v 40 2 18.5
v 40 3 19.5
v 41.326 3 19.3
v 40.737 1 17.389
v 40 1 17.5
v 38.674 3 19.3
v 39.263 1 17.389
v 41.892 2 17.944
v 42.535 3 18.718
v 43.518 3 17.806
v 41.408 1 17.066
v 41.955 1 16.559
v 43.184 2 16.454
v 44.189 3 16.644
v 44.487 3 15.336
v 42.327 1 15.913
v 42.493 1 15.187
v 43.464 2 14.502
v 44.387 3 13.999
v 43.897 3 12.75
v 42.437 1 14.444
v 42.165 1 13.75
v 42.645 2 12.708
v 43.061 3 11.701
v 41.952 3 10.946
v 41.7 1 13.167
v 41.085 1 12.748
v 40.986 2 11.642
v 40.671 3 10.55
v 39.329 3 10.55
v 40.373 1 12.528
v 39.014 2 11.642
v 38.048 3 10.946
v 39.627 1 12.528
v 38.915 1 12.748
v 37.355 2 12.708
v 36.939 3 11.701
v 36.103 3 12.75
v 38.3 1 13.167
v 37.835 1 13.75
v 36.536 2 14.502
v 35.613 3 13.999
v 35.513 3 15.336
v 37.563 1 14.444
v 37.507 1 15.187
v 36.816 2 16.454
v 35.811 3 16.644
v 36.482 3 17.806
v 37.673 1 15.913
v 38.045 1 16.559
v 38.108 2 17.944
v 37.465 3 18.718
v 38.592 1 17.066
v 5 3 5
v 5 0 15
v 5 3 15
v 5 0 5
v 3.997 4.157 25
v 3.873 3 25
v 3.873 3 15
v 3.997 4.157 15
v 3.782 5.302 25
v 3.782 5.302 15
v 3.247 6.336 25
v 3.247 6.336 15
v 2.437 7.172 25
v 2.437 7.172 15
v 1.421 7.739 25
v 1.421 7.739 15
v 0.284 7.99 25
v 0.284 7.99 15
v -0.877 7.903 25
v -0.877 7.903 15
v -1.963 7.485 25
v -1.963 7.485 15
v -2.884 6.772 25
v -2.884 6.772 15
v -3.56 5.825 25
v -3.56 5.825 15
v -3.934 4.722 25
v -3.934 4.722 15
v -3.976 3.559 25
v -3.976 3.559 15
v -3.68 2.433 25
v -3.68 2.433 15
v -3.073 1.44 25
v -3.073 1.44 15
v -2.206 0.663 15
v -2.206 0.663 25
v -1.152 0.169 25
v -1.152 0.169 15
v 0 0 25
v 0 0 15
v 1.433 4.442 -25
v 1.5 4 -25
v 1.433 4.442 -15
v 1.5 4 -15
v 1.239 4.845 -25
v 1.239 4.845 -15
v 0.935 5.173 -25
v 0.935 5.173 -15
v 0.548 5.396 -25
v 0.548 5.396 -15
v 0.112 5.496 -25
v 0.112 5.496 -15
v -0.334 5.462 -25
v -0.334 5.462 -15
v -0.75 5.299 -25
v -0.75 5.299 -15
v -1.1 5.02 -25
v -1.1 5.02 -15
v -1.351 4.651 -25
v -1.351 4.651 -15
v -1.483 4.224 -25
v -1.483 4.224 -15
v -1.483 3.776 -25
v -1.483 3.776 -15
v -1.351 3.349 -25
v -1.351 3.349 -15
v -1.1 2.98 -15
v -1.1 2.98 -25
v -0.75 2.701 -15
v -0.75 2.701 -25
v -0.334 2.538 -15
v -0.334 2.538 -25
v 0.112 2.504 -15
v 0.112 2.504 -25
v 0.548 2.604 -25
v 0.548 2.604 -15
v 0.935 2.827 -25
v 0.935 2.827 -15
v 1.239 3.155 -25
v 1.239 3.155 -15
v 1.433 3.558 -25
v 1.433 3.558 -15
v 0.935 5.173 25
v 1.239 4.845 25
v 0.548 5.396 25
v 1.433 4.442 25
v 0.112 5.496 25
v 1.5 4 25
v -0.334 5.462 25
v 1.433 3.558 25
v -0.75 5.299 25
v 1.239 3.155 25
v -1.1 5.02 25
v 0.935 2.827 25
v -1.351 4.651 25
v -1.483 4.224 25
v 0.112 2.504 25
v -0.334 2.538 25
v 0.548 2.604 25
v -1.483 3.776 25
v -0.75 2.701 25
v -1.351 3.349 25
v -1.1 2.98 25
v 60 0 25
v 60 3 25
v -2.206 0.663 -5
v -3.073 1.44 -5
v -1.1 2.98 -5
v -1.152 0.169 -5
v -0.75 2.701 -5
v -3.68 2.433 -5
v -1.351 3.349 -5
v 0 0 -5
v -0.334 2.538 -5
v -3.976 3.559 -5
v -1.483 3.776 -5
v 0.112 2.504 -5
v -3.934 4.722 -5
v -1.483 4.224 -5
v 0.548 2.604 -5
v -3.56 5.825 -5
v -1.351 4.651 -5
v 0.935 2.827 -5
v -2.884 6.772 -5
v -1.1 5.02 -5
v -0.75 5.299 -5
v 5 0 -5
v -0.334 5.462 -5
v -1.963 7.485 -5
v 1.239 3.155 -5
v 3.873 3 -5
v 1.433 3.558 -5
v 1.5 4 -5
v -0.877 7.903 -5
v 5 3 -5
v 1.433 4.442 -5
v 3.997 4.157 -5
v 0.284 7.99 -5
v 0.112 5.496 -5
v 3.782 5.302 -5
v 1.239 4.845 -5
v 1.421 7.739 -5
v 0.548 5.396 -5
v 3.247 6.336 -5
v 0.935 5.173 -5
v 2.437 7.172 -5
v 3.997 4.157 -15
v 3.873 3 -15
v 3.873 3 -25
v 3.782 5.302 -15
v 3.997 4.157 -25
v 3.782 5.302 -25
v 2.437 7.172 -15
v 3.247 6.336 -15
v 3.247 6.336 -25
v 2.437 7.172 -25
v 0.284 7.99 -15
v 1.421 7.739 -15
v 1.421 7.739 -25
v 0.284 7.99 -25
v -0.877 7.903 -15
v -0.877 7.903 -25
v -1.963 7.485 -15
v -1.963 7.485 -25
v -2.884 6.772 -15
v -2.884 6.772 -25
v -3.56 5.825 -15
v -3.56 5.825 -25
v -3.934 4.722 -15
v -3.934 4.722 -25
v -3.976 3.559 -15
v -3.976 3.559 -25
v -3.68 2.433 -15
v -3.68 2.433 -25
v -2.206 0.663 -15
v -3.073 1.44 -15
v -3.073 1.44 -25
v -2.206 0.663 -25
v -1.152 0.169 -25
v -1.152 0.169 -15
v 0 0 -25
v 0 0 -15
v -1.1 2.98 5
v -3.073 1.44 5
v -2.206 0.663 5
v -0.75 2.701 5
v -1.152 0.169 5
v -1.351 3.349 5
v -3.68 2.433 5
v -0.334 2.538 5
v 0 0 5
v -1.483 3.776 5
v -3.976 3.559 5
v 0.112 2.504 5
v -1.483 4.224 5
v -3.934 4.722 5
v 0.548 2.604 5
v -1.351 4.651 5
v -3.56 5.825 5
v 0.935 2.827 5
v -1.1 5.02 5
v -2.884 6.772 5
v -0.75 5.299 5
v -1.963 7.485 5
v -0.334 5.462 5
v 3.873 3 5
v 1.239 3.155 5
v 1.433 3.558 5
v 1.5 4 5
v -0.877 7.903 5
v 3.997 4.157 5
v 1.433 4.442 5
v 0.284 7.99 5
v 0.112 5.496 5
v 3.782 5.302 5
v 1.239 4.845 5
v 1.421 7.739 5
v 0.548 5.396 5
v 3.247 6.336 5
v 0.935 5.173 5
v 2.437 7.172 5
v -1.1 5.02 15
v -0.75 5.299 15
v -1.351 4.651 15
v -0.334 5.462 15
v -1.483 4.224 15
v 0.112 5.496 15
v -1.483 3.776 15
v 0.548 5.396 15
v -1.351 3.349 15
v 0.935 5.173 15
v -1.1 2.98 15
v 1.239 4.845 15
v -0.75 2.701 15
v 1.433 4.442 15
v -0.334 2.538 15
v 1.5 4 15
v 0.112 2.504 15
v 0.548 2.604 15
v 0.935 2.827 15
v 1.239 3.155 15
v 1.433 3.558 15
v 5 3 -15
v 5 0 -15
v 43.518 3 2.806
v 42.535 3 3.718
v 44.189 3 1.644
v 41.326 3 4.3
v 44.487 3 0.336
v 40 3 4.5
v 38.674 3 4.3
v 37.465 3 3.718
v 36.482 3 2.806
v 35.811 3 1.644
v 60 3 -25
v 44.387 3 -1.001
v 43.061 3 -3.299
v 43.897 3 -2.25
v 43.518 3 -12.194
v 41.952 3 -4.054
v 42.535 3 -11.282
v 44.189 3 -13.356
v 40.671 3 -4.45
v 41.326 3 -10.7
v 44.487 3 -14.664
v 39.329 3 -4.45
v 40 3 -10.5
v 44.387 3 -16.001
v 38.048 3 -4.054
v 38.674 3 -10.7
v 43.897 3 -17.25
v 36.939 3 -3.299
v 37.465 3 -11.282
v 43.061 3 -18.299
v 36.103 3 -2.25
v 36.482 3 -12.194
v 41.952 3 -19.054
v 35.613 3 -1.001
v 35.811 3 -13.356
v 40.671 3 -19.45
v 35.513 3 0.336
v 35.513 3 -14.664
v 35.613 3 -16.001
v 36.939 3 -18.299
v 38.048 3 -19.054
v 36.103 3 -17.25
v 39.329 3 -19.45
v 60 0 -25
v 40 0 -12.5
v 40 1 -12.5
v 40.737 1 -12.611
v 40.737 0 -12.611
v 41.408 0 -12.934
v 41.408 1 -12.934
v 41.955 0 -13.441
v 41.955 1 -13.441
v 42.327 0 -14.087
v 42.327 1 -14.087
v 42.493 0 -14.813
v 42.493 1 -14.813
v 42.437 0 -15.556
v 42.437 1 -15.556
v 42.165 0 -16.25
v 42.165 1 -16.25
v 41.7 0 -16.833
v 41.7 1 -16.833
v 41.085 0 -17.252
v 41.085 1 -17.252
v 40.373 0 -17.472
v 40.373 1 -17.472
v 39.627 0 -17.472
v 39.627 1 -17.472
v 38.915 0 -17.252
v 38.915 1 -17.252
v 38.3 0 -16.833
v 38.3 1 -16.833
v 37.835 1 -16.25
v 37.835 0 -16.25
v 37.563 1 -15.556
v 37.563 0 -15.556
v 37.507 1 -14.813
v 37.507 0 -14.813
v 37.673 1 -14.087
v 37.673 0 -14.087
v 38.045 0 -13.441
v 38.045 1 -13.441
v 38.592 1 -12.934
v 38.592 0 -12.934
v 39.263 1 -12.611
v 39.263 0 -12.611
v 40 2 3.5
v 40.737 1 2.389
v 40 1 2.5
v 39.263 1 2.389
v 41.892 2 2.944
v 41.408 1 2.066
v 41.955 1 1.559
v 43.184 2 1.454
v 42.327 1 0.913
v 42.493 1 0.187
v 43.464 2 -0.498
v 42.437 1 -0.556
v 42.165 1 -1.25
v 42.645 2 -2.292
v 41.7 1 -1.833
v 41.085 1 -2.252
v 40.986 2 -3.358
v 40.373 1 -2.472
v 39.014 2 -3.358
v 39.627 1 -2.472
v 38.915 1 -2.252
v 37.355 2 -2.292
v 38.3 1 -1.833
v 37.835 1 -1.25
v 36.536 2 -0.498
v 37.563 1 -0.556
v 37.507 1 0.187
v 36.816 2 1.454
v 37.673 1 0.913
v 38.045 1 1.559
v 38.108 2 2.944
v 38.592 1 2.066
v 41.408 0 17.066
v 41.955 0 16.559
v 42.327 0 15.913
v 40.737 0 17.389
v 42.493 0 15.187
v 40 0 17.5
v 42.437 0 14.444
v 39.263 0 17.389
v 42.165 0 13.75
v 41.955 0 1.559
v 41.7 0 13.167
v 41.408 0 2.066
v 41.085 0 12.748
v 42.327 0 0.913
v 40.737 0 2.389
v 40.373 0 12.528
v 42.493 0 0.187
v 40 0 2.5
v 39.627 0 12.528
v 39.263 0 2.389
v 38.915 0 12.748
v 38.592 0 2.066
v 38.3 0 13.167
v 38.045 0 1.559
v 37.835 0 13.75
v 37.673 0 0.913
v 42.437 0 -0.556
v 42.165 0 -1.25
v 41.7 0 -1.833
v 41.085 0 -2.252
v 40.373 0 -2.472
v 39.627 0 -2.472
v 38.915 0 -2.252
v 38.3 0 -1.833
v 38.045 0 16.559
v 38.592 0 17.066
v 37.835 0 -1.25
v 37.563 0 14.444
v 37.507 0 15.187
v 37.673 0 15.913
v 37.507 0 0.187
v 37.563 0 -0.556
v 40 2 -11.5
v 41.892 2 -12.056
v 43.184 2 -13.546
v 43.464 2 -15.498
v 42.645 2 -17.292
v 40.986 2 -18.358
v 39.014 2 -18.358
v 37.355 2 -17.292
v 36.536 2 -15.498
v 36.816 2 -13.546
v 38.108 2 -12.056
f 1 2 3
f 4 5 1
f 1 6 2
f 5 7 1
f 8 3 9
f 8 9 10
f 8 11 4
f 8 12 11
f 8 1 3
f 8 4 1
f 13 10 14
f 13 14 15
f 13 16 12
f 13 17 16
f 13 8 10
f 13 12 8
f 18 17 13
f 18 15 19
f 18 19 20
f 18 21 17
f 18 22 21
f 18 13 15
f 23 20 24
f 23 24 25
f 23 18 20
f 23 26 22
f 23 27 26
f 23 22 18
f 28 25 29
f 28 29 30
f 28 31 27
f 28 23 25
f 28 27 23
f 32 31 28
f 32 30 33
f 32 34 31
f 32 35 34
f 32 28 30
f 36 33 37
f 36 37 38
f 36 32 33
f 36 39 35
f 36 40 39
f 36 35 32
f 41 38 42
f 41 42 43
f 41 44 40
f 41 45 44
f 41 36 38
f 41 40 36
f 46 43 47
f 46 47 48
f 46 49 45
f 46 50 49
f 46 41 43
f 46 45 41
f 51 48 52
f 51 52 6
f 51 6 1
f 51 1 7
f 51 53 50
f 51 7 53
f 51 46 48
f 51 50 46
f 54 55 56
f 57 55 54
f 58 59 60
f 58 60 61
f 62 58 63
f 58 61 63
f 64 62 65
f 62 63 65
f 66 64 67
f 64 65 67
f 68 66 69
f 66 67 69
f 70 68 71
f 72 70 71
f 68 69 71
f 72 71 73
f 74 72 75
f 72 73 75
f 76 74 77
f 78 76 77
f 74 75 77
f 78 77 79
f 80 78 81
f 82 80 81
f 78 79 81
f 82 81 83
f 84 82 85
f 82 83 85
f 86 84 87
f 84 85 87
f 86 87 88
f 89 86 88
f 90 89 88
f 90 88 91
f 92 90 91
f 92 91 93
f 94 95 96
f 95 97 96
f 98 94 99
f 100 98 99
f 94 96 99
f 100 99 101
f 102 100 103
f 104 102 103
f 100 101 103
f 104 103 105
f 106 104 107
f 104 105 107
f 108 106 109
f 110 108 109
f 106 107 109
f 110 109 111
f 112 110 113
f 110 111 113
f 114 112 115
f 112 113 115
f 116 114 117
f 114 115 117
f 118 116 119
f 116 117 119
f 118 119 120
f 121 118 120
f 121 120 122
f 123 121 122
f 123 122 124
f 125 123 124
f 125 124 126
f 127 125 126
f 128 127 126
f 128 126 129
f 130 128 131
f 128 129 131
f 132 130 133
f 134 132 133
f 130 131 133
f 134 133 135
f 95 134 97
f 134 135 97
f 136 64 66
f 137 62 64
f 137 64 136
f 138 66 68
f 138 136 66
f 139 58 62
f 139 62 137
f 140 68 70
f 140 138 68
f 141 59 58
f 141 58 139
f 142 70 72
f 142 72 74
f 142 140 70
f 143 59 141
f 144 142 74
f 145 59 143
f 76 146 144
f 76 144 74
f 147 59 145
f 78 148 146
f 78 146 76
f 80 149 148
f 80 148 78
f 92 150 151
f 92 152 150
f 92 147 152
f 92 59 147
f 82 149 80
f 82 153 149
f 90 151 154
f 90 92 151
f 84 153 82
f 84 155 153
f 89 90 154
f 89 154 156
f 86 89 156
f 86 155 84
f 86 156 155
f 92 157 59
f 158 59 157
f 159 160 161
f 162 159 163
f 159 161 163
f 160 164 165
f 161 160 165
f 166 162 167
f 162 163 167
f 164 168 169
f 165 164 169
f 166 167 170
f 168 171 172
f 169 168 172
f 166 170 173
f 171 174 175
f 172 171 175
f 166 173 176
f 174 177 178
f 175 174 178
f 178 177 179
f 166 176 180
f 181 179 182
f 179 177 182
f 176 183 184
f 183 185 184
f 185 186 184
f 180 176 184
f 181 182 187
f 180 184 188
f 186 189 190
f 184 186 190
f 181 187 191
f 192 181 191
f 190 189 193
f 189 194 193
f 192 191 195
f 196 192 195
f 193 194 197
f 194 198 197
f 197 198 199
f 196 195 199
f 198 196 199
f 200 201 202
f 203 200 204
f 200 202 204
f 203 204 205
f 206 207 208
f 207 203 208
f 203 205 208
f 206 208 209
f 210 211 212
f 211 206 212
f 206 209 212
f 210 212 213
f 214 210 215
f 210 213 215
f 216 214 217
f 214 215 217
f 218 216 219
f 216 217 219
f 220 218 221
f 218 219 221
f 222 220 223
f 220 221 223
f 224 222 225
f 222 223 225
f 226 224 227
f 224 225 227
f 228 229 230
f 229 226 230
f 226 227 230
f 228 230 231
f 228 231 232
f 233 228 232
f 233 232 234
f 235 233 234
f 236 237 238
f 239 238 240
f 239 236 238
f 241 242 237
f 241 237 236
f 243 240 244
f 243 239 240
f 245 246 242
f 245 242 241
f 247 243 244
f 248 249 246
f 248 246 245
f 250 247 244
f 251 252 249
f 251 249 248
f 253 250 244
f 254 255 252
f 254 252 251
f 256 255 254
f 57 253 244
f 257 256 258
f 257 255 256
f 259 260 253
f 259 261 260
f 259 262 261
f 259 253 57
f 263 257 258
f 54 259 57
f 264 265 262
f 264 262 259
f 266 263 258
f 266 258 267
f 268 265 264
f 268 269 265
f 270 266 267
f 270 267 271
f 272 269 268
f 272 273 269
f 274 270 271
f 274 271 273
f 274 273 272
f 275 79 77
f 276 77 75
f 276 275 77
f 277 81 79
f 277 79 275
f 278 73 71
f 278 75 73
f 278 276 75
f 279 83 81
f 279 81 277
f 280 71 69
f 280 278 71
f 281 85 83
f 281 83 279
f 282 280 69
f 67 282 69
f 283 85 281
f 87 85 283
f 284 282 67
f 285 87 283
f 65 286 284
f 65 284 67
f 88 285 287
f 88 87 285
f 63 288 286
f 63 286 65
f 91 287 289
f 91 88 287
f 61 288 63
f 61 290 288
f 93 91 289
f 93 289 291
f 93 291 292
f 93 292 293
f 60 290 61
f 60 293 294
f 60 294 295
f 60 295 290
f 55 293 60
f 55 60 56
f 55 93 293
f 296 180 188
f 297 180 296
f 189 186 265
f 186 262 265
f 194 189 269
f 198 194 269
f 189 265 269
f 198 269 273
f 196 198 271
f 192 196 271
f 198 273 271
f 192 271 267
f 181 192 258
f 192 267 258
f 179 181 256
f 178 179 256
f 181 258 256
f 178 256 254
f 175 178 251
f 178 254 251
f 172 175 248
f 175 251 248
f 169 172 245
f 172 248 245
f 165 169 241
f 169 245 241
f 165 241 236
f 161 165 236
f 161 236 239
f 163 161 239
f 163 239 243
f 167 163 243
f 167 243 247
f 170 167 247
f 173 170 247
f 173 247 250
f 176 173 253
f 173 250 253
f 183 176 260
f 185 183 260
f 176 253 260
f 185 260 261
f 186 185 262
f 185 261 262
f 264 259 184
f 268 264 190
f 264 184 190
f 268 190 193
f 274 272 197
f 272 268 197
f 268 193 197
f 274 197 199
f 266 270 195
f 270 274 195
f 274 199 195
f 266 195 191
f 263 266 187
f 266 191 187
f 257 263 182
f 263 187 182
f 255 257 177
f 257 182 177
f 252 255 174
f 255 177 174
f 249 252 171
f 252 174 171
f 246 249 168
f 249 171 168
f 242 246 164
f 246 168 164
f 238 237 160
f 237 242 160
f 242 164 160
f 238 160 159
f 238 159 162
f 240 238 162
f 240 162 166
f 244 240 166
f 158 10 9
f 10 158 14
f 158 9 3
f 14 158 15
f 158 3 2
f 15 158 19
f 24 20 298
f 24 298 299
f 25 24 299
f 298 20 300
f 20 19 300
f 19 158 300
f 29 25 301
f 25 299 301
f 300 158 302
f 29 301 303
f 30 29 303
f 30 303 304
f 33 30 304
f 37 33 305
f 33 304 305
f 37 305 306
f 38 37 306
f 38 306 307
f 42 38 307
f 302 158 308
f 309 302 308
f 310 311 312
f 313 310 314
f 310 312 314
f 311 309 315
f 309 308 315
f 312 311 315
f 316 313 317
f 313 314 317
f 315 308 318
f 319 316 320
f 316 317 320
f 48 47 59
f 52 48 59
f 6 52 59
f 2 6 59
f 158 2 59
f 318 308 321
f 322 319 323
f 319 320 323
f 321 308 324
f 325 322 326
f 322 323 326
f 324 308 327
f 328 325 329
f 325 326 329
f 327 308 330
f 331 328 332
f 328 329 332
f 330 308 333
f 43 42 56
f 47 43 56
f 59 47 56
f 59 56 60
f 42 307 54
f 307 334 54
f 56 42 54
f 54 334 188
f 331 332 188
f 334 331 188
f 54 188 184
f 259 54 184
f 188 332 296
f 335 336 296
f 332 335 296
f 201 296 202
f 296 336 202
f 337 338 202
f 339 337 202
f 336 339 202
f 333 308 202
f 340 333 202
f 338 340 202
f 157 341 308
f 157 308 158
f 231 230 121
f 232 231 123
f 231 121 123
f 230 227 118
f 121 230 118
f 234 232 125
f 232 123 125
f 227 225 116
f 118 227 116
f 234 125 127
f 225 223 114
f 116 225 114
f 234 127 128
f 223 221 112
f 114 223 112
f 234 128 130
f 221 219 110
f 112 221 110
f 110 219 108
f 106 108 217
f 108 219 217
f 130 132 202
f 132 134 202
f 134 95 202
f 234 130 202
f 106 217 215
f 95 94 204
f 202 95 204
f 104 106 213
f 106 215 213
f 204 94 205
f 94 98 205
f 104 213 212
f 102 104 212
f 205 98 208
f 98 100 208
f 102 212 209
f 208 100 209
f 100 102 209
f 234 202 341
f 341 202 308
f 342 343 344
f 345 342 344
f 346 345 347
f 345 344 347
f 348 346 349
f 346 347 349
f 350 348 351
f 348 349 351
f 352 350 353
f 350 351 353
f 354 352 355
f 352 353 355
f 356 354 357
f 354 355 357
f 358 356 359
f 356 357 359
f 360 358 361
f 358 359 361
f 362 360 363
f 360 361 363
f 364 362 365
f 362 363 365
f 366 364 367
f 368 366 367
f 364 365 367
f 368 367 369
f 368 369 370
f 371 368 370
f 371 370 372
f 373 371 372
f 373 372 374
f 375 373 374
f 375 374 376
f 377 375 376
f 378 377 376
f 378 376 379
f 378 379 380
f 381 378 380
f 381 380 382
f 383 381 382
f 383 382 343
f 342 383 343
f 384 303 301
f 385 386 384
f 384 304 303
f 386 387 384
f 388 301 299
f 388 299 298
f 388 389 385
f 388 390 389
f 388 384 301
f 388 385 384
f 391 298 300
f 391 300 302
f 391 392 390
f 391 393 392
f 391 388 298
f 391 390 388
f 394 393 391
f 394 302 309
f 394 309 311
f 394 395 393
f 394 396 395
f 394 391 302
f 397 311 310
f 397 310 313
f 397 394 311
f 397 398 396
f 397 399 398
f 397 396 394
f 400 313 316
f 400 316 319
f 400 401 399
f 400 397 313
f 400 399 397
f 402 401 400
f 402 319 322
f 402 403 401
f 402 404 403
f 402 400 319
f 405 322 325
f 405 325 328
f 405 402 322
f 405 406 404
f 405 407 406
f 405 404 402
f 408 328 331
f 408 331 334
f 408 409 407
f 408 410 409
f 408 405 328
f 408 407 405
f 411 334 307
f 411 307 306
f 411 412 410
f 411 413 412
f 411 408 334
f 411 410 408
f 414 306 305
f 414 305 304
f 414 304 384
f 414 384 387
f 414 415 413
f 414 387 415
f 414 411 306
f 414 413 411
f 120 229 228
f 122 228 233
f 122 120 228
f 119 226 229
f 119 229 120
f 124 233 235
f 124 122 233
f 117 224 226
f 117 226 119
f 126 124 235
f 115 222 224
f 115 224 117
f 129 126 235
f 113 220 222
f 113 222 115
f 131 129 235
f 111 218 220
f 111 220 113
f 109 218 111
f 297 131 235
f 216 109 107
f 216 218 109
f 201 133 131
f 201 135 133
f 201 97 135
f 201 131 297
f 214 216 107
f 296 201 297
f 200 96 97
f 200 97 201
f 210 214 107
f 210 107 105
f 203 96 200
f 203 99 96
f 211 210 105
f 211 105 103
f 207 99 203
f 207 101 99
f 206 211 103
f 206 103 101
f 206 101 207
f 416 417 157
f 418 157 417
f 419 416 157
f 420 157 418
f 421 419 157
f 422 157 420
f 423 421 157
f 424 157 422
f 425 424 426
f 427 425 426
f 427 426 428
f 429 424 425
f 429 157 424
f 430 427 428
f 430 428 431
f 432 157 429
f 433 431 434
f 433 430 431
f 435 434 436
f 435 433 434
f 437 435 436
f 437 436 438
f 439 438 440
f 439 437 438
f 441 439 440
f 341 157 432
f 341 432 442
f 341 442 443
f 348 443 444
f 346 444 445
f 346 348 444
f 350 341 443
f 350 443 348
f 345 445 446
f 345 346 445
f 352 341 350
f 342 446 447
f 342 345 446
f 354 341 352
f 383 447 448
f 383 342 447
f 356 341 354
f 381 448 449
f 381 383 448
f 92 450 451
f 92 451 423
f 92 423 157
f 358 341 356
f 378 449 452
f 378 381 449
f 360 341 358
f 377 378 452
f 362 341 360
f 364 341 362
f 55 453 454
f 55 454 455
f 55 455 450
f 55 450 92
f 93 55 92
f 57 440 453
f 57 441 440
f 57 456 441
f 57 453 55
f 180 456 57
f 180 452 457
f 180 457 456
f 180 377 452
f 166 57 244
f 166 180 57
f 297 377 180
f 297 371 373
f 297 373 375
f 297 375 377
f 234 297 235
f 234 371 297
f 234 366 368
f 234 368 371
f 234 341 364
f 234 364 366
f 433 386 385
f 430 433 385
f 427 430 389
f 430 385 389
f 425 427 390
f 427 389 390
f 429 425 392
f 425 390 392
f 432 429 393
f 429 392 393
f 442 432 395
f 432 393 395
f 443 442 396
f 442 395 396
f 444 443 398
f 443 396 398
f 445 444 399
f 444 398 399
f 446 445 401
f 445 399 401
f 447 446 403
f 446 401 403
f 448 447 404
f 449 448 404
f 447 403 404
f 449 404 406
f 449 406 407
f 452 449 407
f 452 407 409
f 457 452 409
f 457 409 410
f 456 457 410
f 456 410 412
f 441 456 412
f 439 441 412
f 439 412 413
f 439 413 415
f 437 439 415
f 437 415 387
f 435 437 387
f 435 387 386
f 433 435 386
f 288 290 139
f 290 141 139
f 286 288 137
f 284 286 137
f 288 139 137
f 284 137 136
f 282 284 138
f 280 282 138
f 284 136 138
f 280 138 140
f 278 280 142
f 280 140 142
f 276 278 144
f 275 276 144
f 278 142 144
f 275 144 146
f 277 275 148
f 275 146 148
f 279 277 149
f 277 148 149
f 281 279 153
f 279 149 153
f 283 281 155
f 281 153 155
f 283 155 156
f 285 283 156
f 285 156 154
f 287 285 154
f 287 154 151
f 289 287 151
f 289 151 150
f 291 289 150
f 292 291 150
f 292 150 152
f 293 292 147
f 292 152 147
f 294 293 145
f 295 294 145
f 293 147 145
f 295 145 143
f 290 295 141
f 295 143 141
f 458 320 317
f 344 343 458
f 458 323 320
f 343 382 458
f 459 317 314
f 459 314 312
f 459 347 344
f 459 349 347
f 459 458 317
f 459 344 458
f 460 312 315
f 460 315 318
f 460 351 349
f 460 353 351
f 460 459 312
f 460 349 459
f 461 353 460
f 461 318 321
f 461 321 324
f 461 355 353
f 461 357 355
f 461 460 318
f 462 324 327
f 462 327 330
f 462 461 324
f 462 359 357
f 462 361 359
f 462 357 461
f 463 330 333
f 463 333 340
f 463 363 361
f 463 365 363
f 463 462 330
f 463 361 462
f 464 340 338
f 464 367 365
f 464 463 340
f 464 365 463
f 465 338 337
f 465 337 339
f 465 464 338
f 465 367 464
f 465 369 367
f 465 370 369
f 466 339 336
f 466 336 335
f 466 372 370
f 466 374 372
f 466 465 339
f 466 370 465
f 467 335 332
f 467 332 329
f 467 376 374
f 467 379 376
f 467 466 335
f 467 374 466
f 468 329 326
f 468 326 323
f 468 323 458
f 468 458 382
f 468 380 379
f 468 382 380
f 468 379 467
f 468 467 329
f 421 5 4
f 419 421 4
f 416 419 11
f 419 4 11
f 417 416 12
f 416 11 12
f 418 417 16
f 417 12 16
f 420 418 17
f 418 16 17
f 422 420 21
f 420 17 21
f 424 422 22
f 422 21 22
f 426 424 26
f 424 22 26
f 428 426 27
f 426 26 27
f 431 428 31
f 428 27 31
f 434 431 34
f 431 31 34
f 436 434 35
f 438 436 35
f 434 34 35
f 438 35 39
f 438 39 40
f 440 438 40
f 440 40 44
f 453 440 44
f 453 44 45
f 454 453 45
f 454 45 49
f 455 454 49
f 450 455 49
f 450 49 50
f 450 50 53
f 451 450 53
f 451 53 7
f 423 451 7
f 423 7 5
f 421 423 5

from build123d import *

# Parameters (mm, degrees)
EXTRUDE_1_DEPTH        = 3
SKETCH_2_R             = 4
EXTRUDE_2_DEPTH        = 10
PATTERN_LINEAR_1_COUNT = 3
PATTERN_LINEAR_1_PITCH = 20
SKETCH_3_R             = 1.5
CUT_EXTRUDE_1_DEPTH    = 65
SKETCH_4_R             = 2.5
CUT_EXTRUDE_2_DEPTH    = 66.192024052


with BuildPart() as part:
    # 草图1 → 凸台-拉伸1 (new body)
    with BuildSketch(Plane(origin=(0, 0, 0), x_dir=(1, 0, 0), z_dir=(0, 1, 0))):
        Polygon((0, 25), (60, 25), (60, -25), (0, -25), (0, -15), (5, -15), (5, -5), (0, -5), (0, 5), (5, 5), (5, 15), (0, 15), align=None)
    extrude(amount=EXTRUDE_1_DEPTH)

    # 草图2 → 凸台-拉伸2 (add)
    with BuildSketch(Plane.XY.offset(-25)):
        with Locations((0, 4)):
            Circle(SKETCH_2_R)
    extrude_2 = extrude(amount=EXTRUDE_2_DEPTH)

    # 阵列(线性)1: 凸台-拉伸2 ×3
    with Locations(*[(0, 0, i * PATTERN_LINEAR_1_PITCH) for i in range(1, PATTERN_LINEAR_1_COUNT)]):
        add(extrude_2)

    # 草图3 → 切除-拉伸1 (cut, symmetric)
    with BuildSketch(Plane.XY.offset(-25)):
        with Locations((0, 4)):
            Circle(SKETCH_3_R)
    extrude(amount=CUT_EXTRUDE_1_DEPTH, both=True, mode=Mode.SUBTRACT)

    # 草图4 → 切除-拉伸2 (cut, through all)
    with BuildSketch(Plane(origin=(0, 3, 0), x_dir=(1, 0, 0), z_dir=(0, 1, 0))):
        with Locations(Location((40, 15, 0), (0, 0, 270))):
            Circle(SKETCH_4_R)
        with Locations(Location((40, 0, 0), (0, 0, 270))):
            Circle(SKETCH_4_R)
        with Locations(Location((40, -15, 0), (0, 0, 270))):
            Circle(SKETCH_4_R)
    extrude(amount=-CUT_EXTRUDE_2_DEPTH, mode=Mode.SUBTRACT)

    # 草图10 → 切除-旋转1 (revolve, cut)
    with BuildSketch(Plane(origin=(40, 0, 0), x_dir=(0, 0, -1), z_dir=(1, 0, 0))):
        Polygon((12.5, 3), (10.5, 3), (12.5, 1), align=None)
    revolve(axis=Axis((40, 0, -15), (0, 1, 0)), mode=Mode.SUBTRACT)

    # 草图11 → 切除-旋转2 (revolve, cut)
    with BuildSketch(Plane(origin=(40, 0, 0), x_dir=(0, 0, -1), z_dir=(1, 0, 0))):
        Polygon((-2.5, 3), (-4.5, 3), (-2.5, 1), align=None)
    revolve(axis=Axis((40, 0, 0), (0, 1, 0)), mode=Mode.SUBTRACT)

    # 草图12 → 切除-旋转3 (revolve, cut)
    with BuildSketch(Plane(origin=(40, 0, 0), x_dir=(0, 0, -1), z_dir=(1, 0, 0))):
        Polygon((-17.5, 3), (-19.5, 3), (-17.5, 1), align=None)
    revolve(axis=Axis((40, 0, 15), (0, 1, 0)), mode=Mode.SUBTRACT)


solid = part.part
